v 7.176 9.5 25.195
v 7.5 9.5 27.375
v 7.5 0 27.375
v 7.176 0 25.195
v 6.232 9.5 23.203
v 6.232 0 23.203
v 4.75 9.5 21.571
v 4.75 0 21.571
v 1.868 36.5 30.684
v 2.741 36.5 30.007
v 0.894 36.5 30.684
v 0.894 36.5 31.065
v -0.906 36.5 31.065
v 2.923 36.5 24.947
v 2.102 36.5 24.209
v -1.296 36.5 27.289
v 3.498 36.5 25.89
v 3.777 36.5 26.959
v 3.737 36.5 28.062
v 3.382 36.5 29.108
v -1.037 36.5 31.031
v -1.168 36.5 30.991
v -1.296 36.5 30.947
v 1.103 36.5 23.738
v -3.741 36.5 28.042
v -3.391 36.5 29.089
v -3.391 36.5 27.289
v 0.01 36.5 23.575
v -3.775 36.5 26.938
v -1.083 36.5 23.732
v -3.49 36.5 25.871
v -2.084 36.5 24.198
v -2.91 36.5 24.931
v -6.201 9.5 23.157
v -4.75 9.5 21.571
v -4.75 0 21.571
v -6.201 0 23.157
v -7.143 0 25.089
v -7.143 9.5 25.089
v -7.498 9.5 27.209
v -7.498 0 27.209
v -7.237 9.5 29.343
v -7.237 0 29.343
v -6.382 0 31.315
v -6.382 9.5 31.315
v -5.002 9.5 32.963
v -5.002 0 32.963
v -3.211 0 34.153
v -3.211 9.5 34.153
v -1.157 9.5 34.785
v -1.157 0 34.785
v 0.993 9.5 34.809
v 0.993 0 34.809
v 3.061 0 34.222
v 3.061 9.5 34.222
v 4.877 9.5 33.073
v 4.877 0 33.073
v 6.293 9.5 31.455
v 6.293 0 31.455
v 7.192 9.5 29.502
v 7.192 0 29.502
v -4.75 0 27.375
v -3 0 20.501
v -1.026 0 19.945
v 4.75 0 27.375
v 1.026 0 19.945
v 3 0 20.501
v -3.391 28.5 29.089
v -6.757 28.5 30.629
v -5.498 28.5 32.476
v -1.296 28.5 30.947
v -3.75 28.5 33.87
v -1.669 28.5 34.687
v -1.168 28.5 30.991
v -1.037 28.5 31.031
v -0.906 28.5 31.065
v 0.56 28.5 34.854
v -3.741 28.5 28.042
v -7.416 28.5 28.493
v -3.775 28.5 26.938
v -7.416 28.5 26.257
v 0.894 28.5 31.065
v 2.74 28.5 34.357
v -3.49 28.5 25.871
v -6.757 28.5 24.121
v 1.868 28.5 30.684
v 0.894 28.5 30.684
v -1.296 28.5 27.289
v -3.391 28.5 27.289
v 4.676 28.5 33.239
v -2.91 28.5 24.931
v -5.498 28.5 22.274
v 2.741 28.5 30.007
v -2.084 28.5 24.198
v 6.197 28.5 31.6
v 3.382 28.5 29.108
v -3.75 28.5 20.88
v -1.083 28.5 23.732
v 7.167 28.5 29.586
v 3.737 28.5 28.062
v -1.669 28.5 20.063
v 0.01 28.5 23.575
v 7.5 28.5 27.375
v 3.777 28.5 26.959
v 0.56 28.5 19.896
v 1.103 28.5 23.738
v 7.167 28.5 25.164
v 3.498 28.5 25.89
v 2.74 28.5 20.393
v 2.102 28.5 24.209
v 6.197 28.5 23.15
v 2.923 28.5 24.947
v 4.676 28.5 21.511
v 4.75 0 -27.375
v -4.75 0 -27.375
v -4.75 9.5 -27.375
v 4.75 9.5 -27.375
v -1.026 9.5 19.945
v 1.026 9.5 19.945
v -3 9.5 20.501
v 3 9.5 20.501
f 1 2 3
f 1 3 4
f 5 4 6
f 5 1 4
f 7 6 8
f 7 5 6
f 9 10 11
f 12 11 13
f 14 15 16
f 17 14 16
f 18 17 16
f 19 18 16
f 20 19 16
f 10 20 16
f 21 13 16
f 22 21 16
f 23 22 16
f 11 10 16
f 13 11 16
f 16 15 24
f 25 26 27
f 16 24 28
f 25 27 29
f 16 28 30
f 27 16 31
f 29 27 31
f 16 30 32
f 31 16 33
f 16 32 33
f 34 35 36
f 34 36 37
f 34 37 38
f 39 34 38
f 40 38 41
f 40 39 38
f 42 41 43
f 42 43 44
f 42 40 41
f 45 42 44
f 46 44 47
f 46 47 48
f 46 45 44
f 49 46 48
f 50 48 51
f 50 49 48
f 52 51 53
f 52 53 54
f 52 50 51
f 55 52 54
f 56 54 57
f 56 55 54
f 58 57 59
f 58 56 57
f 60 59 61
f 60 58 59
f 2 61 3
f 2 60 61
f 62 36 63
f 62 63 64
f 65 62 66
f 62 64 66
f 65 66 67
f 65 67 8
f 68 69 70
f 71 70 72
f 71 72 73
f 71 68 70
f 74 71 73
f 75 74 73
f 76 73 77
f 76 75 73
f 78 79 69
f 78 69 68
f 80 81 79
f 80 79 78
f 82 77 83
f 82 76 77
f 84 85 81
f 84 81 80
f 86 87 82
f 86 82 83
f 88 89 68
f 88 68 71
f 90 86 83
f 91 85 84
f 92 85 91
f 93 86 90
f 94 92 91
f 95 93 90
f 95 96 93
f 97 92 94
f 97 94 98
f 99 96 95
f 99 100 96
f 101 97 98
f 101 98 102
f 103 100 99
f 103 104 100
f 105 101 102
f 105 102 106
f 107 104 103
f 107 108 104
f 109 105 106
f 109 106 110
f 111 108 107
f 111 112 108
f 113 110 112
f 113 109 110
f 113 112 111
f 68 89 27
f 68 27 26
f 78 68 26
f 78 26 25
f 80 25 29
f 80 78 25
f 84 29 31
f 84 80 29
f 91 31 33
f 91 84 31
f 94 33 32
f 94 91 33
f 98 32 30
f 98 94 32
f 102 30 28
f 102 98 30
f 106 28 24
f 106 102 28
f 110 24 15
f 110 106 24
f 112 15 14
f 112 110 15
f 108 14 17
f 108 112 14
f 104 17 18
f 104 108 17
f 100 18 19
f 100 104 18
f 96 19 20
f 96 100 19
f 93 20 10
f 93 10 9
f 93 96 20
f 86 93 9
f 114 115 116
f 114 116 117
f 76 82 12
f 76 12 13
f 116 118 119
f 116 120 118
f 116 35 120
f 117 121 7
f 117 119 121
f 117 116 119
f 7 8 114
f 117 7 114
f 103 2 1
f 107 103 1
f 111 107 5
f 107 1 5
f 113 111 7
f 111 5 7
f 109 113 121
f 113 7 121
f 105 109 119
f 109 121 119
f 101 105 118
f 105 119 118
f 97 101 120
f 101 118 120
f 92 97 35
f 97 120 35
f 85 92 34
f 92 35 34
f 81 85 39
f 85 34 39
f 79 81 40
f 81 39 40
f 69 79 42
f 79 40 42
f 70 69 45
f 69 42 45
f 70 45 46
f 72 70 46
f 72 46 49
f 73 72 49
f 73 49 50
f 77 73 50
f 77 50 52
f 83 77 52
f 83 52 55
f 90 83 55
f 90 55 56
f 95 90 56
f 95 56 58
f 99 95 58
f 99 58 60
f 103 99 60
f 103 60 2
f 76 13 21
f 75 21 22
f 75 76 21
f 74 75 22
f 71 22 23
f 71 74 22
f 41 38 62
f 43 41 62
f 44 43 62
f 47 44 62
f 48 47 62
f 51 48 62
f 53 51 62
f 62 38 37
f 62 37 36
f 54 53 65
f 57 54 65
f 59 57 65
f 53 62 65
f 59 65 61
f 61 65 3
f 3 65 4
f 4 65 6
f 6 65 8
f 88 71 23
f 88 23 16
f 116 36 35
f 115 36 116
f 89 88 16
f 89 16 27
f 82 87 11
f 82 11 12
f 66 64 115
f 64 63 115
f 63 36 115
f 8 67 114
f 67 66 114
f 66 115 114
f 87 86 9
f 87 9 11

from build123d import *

# Parameters (mm, degrees)
SKETCH1_W                = 9.5
SKETCH1_H                = 54.75
BOSS_EXTRUDE1_DEPTH      = 9.5
SKETCH2_R                = 7.5
BOSS_EXTRUDE2_DEPTH      = 19
BOSS_EXTRUDE2_DEPTH_BACK = 9.5
BOSS_EXTRUDE3_DEPTH      = 8


with BuildPart() as part:
    # Sketch1 → Boss-Extrude1 (new body)
    with BuildSketch(Plane(origin=(0, 0, 0), x_dir=(1, 0, 0), z_dir=(0, 1, 0))):
        Rectangle(SKETCH1_W, SKETCH1_H)
    extrude(amount=BOSS_EXTRUDE1_DEPTH)

    # Sketch2 → Boss-Extrude2 (add, two sides)
    with BuildSketch(Plane(origin=(0, 9.5, 0), x_dir=(1, 0, 0), z_dir=(0, 1, 0))) as boss_extrude2_sk:
        with Locations((0, -27.375)):
            Circle(SKETCH2_R)
    extrude(amount=BOSS_EXTRUDE2_DEPTH)
    extrude(boss_extrude2_sk.sketch, amount=-BOSS_EXTRUDE2_DEPTH_BACK)

    # Sketch3 → Boss-Extrude3 (add)
    with BuildSketch(Plane(origin=(0, 28.5, 0), x_dir=(1, 0, 0), z_dir=(0, 1, 0))):
        with BuildLine():
            Line((-1.29624151, -30.947080339), (-1.29624151, -27.289433429))
            Line((-1.29624151, -27.289433429), (-3.391270856, -27.289433429))
            Line((-3.391270856, -27.289433429), (-3.391270856, -29.089433429))
            ThreePointArc((-3.391270856, -29.089433429), (1.102654775, -23.738497223), (1.86802767, -30.684149834))
            Line((1.86802767, -30.684149834), (0.894110574, -30.684149834))
            Line((0.894110574, -30.684149834), (0.894110574, -31.065442297))
            Line((0.894110574, -31.065442297), (-0.905889426, -31.065442297))
            ThreePointArc((-0.905889426, -31.065442297), (-1.102654775, -31.011502777), (-1.29624151, -30.947080339))
        make_face()
    extrude(amount=BOSS_EXTRUDE3_DEPTH)


solid = part.part
